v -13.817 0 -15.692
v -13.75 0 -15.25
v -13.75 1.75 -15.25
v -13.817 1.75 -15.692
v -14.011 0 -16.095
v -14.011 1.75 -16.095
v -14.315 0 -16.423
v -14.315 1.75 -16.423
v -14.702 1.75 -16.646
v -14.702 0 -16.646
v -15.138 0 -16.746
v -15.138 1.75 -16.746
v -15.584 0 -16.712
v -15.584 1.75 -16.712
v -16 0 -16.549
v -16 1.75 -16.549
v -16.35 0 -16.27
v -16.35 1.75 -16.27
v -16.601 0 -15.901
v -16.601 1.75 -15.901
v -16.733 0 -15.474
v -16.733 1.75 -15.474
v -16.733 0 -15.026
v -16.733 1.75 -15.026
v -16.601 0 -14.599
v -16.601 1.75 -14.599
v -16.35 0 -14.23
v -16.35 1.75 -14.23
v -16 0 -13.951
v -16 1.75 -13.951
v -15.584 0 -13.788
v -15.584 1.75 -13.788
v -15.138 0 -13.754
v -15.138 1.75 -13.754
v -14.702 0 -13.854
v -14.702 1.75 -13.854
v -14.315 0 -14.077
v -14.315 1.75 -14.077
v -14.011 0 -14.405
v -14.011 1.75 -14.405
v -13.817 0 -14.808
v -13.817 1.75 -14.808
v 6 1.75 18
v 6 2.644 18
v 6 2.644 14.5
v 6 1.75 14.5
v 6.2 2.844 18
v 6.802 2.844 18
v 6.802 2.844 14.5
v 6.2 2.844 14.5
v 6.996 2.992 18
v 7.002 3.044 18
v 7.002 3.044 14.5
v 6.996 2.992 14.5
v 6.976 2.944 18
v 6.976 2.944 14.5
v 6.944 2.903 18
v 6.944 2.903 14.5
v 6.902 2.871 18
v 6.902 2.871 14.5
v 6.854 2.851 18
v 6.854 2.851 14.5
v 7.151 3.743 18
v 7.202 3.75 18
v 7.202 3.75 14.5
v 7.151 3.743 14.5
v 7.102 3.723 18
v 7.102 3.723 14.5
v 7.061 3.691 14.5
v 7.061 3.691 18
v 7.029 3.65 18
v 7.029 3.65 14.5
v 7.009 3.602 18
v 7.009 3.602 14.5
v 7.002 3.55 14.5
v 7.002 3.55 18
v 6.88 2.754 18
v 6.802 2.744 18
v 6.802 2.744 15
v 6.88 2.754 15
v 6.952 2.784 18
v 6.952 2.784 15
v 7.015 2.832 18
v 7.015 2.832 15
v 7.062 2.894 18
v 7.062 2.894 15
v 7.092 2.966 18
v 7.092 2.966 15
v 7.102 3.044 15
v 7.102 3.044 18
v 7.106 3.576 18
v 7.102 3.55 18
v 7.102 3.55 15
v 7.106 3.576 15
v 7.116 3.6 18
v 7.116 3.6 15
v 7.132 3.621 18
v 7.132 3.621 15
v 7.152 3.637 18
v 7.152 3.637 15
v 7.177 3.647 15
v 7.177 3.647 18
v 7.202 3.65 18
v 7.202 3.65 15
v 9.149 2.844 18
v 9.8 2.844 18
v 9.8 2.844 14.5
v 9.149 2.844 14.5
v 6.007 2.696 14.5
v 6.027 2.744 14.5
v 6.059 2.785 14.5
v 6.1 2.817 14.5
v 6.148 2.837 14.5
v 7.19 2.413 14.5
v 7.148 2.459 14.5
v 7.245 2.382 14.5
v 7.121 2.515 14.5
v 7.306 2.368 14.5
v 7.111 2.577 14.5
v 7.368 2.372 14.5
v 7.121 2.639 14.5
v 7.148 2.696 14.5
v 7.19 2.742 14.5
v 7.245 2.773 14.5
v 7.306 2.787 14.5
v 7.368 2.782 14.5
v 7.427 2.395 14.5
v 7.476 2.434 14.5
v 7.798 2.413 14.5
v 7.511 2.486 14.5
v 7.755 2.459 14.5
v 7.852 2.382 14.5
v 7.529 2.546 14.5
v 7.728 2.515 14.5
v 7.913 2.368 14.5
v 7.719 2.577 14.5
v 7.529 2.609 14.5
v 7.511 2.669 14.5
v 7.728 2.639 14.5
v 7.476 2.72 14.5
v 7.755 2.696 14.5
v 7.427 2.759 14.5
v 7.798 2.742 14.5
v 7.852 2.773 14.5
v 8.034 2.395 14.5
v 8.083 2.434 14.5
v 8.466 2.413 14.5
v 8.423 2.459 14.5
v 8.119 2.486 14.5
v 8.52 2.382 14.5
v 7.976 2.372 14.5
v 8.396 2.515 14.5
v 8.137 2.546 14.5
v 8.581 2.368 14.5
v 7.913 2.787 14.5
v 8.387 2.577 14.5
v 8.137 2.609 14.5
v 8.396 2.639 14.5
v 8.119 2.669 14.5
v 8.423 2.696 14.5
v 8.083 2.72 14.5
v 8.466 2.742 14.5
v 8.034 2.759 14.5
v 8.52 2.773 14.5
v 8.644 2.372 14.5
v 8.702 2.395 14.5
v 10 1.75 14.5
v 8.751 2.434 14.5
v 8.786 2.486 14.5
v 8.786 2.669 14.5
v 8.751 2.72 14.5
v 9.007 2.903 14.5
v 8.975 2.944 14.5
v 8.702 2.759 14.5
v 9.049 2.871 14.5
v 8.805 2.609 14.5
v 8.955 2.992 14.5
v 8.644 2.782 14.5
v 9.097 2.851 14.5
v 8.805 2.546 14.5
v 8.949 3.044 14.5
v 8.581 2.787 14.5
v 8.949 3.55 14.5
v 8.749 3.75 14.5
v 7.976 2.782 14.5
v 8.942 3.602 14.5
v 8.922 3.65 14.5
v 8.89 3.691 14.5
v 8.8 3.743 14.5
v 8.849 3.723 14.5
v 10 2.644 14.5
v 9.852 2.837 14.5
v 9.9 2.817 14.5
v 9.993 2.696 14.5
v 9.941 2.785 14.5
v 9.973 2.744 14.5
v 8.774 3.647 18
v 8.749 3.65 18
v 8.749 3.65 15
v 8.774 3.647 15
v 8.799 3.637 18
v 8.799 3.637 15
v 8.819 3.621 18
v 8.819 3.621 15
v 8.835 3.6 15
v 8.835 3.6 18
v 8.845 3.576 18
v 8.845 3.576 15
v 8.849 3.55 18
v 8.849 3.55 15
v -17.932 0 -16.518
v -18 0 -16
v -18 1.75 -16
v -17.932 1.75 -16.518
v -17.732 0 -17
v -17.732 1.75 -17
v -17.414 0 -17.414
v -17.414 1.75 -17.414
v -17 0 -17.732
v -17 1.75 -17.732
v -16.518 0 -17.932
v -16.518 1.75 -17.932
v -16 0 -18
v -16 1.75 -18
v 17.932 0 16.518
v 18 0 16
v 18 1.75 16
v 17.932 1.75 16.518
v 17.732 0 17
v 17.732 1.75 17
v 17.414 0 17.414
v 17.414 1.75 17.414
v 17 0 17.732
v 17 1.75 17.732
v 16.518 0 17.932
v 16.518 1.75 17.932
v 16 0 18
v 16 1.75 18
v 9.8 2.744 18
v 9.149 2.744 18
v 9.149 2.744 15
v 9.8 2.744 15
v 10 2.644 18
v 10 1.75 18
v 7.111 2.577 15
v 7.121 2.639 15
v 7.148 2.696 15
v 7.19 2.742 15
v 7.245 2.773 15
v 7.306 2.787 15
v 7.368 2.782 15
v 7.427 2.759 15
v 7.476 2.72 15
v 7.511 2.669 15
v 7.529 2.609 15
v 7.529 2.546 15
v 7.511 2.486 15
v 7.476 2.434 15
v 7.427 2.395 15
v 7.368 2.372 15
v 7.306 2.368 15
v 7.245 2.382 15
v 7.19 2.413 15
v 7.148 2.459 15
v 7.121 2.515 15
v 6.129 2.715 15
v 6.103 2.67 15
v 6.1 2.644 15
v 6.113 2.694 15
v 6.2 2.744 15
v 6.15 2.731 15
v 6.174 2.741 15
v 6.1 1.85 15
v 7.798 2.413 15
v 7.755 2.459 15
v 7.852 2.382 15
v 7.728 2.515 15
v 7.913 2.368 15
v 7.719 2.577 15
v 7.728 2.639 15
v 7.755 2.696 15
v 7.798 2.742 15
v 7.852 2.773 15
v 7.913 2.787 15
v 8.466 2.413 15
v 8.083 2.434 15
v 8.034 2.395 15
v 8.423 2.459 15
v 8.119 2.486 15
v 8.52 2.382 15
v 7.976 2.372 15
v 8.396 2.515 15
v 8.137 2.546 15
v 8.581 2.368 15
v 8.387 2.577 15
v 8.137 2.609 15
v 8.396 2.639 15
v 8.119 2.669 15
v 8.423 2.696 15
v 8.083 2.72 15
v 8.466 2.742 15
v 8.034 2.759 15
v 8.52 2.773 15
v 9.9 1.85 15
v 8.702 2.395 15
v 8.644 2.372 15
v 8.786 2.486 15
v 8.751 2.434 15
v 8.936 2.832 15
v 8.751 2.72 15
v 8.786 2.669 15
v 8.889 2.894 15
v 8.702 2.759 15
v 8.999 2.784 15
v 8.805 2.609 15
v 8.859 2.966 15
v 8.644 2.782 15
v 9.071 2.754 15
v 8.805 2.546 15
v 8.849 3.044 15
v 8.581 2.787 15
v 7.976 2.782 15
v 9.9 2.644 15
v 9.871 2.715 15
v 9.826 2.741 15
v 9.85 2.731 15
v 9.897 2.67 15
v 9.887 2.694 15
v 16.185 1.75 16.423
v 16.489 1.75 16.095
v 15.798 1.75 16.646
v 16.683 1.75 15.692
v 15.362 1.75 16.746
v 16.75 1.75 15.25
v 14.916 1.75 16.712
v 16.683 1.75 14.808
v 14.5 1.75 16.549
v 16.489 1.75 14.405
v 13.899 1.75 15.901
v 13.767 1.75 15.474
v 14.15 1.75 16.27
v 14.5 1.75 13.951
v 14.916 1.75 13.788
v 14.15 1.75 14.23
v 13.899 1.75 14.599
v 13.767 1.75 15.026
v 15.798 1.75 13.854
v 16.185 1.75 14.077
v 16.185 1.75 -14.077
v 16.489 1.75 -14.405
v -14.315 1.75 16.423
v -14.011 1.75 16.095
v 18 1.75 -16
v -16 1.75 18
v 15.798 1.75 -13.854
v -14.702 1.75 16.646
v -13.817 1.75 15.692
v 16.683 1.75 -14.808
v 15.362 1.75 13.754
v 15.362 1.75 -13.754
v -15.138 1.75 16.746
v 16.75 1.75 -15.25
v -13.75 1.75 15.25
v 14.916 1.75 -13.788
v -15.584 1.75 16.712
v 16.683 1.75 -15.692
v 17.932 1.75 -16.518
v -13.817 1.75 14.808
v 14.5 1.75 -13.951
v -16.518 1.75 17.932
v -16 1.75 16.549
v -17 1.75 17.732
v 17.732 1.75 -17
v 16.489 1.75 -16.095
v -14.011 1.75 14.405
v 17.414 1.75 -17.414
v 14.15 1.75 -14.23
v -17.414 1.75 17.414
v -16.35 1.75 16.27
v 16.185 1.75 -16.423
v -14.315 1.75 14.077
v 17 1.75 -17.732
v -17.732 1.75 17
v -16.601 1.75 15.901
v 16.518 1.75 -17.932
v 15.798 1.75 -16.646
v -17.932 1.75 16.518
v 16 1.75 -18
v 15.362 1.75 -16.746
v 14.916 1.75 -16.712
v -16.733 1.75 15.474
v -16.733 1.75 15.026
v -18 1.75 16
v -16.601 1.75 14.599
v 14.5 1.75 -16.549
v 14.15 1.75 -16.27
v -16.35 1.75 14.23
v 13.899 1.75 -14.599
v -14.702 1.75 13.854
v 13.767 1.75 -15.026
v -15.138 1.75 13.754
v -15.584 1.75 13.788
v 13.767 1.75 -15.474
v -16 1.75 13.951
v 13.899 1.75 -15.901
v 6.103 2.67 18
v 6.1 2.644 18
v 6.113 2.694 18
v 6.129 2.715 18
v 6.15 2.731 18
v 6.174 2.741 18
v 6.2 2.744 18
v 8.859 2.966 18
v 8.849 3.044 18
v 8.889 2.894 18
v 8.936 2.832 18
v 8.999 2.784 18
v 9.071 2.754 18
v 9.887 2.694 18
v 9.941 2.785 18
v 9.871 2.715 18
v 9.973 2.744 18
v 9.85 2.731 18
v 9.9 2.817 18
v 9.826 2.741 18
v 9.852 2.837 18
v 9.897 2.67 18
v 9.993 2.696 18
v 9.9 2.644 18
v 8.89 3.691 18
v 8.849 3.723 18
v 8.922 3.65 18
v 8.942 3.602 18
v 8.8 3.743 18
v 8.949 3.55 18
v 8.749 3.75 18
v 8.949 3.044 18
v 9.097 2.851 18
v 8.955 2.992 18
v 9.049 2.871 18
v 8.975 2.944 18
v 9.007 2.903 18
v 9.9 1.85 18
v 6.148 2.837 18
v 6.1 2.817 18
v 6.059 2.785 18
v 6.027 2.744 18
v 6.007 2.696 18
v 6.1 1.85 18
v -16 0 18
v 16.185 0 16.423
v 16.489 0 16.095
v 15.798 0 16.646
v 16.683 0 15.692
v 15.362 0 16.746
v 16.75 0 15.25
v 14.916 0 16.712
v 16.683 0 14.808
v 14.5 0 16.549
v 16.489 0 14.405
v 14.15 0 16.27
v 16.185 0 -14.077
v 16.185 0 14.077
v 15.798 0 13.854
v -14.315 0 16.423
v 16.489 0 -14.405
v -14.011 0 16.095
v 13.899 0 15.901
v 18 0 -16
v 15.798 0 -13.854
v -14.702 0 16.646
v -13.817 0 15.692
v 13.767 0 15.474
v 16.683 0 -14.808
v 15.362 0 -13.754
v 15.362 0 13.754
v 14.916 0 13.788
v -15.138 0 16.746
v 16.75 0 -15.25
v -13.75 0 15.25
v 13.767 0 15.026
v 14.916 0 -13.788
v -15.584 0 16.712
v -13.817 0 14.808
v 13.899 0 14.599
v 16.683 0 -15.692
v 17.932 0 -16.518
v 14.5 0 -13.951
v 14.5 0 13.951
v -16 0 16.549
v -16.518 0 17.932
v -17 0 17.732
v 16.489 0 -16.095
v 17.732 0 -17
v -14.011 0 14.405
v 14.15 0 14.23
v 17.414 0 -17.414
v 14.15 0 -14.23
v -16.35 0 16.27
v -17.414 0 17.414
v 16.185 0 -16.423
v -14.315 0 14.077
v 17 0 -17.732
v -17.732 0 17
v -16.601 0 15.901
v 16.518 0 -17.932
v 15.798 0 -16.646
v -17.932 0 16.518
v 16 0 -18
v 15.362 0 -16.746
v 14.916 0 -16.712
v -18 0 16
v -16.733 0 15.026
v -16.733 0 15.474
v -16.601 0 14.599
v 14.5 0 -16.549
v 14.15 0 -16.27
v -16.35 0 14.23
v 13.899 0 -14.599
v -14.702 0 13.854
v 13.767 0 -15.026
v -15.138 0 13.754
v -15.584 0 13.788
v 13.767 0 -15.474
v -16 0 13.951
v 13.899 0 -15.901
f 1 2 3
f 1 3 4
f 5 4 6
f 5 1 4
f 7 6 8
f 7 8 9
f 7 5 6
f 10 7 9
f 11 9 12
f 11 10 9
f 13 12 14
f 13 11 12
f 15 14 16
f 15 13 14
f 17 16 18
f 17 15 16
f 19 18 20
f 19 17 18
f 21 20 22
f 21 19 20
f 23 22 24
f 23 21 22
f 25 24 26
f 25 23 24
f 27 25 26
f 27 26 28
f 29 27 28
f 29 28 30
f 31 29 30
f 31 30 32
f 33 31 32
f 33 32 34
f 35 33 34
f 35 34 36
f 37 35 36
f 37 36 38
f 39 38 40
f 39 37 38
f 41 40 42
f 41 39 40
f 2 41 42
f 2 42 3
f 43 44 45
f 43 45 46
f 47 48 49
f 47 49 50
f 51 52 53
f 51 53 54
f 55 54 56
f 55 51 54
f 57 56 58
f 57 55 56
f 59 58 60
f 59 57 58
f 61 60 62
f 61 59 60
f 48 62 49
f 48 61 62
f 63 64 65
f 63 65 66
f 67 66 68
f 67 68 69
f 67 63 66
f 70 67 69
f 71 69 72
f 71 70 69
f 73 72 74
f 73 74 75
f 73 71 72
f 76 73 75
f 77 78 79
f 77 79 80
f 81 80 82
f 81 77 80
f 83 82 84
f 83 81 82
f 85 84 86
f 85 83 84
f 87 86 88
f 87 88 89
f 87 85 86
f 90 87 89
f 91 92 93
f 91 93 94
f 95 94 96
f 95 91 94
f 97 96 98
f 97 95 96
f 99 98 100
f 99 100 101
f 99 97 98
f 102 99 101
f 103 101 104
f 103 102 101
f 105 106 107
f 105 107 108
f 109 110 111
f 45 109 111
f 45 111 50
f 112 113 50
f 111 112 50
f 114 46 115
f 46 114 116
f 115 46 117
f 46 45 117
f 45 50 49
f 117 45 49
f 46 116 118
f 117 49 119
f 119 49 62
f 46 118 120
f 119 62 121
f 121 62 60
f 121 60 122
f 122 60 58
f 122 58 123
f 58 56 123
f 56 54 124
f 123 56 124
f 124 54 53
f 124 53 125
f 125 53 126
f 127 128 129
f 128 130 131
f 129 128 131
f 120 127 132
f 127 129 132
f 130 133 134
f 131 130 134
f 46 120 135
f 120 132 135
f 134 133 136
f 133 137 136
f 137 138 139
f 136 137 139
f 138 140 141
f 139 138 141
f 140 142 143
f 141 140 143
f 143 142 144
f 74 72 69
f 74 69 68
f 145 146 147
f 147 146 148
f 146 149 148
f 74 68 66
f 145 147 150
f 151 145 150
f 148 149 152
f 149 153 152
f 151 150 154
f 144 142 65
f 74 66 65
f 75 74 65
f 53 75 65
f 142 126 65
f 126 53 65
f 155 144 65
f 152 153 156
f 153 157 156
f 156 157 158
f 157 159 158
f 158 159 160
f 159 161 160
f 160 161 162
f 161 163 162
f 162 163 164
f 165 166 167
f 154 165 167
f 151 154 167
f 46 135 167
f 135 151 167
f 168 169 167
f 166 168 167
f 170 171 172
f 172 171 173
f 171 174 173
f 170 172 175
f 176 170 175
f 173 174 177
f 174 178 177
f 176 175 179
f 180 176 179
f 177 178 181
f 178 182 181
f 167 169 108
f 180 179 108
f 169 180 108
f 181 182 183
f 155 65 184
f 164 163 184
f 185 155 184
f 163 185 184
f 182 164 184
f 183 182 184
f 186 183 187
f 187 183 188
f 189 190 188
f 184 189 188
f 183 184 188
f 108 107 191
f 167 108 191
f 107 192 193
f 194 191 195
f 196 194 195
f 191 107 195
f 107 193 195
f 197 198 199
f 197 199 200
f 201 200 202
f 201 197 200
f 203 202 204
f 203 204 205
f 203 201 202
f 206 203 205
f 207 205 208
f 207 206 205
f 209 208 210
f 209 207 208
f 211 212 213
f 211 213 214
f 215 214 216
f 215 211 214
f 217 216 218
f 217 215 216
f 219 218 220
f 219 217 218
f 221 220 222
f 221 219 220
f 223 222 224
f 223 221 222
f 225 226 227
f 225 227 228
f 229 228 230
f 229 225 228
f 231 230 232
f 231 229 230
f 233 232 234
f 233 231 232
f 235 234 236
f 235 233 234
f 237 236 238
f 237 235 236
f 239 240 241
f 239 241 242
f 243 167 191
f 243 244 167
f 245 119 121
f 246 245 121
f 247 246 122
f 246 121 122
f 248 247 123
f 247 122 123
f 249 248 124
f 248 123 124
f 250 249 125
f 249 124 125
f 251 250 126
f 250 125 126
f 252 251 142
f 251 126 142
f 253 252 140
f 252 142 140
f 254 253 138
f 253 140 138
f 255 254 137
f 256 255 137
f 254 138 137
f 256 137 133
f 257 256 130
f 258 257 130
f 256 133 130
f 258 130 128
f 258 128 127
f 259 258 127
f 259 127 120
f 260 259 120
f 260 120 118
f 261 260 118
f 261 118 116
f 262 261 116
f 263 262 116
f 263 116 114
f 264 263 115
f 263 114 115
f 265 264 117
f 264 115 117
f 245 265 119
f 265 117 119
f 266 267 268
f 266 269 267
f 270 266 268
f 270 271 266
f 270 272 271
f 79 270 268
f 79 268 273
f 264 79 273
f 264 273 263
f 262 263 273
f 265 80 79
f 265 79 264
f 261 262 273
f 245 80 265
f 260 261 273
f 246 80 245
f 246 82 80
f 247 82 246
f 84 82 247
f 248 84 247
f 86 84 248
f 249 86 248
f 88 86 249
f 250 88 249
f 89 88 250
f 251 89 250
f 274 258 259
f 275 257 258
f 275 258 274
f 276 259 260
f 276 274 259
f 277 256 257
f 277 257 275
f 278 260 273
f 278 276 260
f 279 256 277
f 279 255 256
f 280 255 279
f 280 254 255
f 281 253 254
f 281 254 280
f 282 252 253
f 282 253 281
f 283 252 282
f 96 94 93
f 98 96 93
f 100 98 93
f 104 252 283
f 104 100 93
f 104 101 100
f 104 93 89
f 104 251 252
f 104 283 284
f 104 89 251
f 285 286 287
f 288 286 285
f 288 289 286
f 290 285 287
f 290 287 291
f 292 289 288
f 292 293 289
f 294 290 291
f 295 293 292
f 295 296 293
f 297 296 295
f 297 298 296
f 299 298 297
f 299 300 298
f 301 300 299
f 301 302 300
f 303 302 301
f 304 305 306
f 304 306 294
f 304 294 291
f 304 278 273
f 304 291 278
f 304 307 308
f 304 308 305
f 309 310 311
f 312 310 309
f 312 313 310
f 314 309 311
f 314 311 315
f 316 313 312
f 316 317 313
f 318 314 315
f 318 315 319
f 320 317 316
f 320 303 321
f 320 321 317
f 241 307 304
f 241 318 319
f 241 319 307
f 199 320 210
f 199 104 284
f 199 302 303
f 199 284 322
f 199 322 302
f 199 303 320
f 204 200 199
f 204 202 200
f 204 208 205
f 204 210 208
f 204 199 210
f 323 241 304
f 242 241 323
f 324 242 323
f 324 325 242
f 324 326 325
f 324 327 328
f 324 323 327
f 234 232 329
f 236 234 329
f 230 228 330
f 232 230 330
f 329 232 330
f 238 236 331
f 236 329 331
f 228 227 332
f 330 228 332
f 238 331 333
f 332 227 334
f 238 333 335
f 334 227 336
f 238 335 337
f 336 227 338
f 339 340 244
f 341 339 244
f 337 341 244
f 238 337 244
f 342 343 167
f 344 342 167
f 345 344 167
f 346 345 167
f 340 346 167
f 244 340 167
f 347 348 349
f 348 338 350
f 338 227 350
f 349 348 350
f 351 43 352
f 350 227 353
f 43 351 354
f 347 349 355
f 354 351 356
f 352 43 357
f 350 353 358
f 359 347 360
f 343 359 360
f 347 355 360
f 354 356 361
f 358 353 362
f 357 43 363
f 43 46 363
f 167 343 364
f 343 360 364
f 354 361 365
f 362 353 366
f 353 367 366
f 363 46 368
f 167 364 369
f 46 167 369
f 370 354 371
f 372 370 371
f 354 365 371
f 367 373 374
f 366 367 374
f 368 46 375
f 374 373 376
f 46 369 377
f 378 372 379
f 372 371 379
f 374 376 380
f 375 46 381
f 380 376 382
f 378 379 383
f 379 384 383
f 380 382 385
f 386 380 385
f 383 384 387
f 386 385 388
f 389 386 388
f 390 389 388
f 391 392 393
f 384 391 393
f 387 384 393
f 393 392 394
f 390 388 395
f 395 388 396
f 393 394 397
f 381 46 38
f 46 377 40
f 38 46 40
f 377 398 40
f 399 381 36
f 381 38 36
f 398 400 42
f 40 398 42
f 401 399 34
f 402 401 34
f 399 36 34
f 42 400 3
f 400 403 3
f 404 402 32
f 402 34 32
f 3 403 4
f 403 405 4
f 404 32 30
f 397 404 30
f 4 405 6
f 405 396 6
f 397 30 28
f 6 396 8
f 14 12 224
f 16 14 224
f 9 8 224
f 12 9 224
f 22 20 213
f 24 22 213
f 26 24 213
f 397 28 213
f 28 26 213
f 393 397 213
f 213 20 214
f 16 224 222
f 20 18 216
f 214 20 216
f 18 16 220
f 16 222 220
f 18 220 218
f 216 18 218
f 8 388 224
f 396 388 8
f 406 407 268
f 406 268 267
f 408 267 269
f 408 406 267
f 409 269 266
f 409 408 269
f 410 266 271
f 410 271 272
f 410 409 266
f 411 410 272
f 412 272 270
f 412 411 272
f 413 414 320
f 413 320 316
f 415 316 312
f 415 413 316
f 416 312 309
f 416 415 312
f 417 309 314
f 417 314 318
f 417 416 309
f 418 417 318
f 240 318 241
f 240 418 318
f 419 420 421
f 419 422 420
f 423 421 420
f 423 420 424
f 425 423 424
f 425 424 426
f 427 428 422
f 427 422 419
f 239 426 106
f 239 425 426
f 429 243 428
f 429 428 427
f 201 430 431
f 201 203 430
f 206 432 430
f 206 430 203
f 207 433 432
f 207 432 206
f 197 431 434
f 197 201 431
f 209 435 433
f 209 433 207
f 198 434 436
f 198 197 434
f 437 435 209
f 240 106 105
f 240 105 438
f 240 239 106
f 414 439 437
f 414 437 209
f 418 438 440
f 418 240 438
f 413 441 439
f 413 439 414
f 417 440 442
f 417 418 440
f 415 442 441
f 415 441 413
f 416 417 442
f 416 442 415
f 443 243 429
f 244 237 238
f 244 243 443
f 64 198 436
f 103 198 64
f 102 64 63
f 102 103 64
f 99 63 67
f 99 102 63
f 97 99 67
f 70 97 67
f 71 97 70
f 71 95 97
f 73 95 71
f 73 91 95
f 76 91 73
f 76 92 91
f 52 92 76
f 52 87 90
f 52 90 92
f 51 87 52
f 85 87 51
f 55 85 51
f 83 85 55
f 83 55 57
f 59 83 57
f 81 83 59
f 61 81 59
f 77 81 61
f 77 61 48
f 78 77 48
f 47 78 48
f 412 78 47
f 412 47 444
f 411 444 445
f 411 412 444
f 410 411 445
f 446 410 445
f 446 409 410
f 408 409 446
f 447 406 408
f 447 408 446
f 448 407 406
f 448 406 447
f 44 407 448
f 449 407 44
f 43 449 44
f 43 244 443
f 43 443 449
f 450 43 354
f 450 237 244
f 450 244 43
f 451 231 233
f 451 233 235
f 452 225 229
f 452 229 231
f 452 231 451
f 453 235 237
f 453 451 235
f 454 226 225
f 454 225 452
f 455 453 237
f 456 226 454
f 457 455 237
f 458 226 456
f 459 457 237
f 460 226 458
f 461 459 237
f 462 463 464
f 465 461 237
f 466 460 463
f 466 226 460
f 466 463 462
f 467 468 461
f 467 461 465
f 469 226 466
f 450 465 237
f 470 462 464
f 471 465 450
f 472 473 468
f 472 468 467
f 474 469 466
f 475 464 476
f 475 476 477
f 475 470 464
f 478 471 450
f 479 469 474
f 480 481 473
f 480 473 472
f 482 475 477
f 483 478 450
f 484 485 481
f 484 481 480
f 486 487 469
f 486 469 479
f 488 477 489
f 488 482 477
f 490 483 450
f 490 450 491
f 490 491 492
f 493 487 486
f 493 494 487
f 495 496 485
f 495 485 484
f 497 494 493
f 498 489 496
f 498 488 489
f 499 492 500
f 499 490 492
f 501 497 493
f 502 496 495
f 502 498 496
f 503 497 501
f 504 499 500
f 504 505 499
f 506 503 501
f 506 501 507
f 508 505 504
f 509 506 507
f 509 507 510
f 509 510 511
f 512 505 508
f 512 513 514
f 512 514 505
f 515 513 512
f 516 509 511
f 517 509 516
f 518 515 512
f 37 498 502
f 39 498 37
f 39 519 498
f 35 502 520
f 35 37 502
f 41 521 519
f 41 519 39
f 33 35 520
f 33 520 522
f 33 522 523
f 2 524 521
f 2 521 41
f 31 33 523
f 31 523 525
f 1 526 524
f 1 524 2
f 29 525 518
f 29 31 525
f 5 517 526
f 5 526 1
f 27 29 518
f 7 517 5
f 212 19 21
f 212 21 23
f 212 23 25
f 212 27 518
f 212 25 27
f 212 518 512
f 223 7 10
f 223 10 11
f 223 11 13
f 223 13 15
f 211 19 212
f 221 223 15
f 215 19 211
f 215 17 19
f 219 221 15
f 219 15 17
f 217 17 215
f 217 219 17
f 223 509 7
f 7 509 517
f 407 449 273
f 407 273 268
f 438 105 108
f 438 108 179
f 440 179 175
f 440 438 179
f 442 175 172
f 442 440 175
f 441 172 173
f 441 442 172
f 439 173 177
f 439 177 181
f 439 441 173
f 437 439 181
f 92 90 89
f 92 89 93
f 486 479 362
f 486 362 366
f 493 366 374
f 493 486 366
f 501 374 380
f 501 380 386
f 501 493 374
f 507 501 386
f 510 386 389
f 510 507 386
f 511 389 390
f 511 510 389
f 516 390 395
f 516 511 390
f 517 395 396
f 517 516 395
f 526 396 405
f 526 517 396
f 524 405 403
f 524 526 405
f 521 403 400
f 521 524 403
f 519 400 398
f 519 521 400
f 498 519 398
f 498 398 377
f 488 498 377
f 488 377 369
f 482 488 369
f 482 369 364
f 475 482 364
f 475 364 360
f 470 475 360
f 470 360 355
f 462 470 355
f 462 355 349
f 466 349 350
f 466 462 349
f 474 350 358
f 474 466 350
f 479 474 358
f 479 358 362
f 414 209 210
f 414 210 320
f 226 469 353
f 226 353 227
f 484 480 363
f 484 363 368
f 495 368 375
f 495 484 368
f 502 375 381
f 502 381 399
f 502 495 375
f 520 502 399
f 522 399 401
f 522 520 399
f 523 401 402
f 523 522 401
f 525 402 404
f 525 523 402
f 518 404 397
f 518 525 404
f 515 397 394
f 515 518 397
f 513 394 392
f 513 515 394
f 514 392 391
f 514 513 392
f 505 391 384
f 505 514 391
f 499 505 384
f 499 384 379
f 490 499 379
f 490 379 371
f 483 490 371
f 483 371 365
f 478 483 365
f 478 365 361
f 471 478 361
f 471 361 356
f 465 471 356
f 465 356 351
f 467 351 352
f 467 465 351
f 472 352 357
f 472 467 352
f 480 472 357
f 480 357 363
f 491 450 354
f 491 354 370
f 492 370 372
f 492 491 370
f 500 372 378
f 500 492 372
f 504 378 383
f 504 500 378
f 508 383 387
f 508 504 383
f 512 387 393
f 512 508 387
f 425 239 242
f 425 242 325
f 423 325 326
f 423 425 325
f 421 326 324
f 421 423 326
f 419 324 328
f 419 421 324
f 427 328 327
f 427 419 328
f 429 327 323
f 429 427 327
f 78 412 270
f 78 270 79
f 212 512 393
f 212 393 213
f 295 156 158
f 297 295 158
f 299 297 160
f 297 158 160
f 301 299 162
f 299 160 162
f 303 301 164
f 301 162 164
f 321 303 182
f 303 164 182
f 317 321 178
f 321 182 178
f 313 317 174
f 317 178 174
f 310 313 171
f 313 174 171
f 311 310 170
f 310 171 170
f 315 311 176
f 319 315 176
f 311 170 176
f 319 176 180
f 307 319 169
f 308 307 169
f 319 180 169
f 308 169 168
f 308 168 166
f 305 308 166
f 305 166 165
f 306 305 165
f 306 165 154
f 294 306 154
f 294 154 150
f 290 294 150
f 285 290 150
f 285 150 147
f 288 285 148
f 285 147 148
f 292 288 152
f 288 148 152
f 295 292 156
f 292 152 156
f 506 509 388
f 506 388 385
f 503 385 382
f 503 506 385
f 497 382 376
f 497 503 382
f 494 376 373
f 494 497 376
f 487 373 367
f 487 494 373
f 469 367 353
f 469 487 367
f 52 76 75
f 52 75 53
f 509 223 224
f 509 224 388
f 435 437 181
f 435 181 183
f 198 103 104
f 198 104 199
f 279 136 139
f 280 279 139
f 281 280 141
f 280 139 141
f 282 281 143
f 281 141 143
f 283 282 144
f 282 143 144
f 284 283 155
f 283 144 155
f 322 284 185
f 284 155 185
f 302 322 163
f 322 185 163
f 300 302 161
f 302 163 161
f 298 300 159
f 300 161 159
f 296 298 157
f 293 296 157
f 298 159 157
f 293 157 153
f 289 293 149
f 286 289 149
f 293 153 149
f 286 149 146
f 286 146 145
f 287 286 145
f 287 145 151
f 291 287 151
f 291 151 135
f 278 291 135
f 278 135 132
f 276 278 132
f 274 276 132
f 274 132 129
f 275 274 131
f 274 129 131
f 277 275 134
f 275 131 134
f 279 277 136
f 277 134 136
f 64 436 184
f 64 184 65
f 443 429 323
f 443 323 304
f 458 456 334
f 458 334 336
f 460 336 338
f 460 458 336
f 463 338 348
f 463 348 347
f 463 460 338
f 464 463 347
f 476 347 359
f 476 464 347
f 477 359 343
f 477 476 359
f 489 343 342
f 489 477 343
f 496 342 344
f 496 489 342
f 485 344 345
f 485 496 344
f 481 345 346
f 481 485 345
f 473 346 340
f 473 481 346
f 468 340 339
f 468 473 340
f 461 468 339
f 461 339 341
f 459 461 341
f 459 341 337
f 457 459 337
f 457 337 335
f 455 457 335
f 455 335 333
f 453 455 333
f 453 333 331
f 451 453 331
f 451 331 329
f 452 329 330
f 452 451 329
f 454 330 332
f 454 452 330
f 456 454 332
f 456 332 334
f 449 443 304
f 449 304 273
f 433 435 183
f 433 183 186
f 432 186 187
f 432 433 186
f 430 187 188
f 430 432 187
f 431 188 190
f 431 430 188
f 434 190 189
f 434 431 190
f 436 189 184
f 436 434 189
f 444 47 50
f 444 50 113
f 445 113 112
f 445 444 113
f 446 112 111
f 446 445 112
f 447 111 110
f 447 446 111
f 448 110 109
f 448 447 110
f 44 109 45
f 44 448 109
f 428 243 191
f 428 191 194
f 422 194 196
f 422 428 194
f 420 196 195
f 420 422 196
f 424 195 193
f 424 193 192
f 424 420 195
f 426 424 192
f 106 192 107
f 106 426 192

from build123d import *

# Parameters (mm, degrees)
SKETCH1_R           = 1.5
BOSS_EXTRUDE2_DEPTH = 1.75
BOSS_EXTRUDE3_DEPTH = 3
BOSS_EXTRUDE4_DEPTH = 0.5
SKETCH5_R           = 0.210276494
CUT_EXTRUDE1_DEPTH  = 0.5


with BuildPart() as part:
    # Sketch1 → Boss-Extrude2 (new body)
    with BuildSketch(Plane(origin=(0, 0, 0), x_dir=(1, 0, 0), z_dir=(0, 1, 0))):
        with BuildLine():
            Line((-16, 18), (16, 18))
            ThreePointArc((16, 18), (17.414213562, 17.414213562), (18, 16))
            Line((18, 16), (18, -16))
            ThreePointArc((18, -16), (17.414213562, -17.414213562), (16, -18))
            Line((16, -18), (-16, -18))
            ThreePointArc((-16, -18), (-17.414213562, -17.414213562), (-18, -16))
            Line((-18, -16), (-18, 16))
            ThreePointArc((-18, 16), (-17.414213562, 17.414213562), (-16, 18))
        make_face()
        with Locations((-15.25, 15.25)):
            Circle(SKETCH1_R, mode=Mode.SUBTRACT)
        with Locations((15.25, 15.25)):
            Circle(SKETCH1_R, mode=Mode.SUBTRACT)
        with Locations((15.25, -15.25)):
            Circle(SKETCH1_R, mode=Mode.SUBTRACT)
        with Locations((-15.25, -15.25)):
            Circle(SKETCH1_R, mode=Mode.SUBTRACT)
    extrude(amount=BOSS_EXTRUDE2_DEPTH)

    # Sketch3 → Boss-Extrude3 (add)
    with BuildSketch(Plane.XY.offset(18)):
        with BuildLine():
            Line((6, 1.75), (10, 1.75))
            Line((10, 1.75), (10, 2.643928524))
            ThreePointArc((10, 2.643928524), (9.941421356, 2.78534988), (9.8, 2.843928524))
            Line((9.8, 2.843928524), (9.148500836, 2.843928524))
            ThreePointArc((9.148500836, 2.843928524), (9.007079479, 2.902507168), (8.948500836, 3.043928524))
            Line((8.948500836, 3.043928524), (8.948500836, 3.55))
            ThreePointArc((8.948500836, 3.55), (8.889922192, 3.691421356), (8.748500836, 3.75))
            Line((8.748500836, 3.75), (7.202410951, 3.75))
            ThreePointArc((7.202410951, 3.75), (7.060989594, 3.691421356), (7.002410951, 3.55))
            Line((7.002410951, 3.55), (7.002410951, 3.043928524))
            ThreePointArc((7.002410951, 3.043928524), (6.943832307, 2.902507168), (6.802410951, 2.843928524))
            Line((6.802410951, 2.843928524), (6.2, 2.843928524))
            ThreePointArc((6.2, 2.843928524), (6.058578644, 2.78534988), (6, 2.643928524))
            Line((6, 2.643928524), (6, 1.75))
        make_face()
        with BuildLine():
            Line((6.1, 1.85), (6.1, 2.643928524))
            ThreePointArc((6.1, 2.643928524), (6.129289322, 2.714639202), (6.2, 2.743928524))
            Line((6.2, 2.743928524), (6.802410951, 2.743928524))
            ThreePointArc((6.802410951, 2.743928524), (7.014542985, 2.83179649), (7.102410951, 3.043928524))
            Line((7.102410951, 3.043928524), (7.102410951, 3.55))
            ThreePointArc((7.102410951, 3.55), (7.131700273, 3.620710678), (7.202410951, 3.65))
            Line((7.202410951, 3.65), (8.748500836, 3.65))
            ThreePointArc((8.748500836, 3.65), (8.819211514, 3.620710678), (8.848500836, 3.55))
            Line((8.848500836, 3.55), (8.848500836, 3.043928524))
            ThreePointArc((8.848500836, 3.043928524), (8.936368801, 2.83179649), (9.148500836, 2.743928524))
            Line((9.148500836, 2.743928524), (9.8, 2.743928524))
            ThreePointArc((9.8, 2.743928524), (9.870710678, 2.714639202), (9.9, 2.643928524))
            Line((9.9, 2.643928524), (9.9, 1.85))
            Line((9.9, 1.85), (6.1, 1.85))
        make_face(mode=Mode.SUBTRACT)
    extrude(amount=-BOSS_EXTRUDE3_DEPTH)

    # Sketch4 → Boss-Extrude4 (add)
    with BuildSketch(Plane(origin=(0, 0, 15), x_dir=(-1, 0, 0), z_dir=(0, 0, -1))):
        with BuildLine():
            Line((-6, 1.75), (-10, 1.75))
            Line((-10, 1.75), (-10, 2.643928524))
            ThreePointArc((-10, 2.643928524), (-9.941421356, 2.78534988), (-9.8, 2.843928524))
            Line((-9.8, 2.843928524), (-9.148500836, 2.843928524))
            ThreePointArc((-9.148500836, 2.843928524), (-9.007079479, 2.902507168), (-8.948500836, 3.043928524))
            Line((-8.948500836, 3.043928524), (-8.948500836, 3.55))
            ThreePointArc((-8.948500836, 3.55), (-8.889922192, 3.691421356), (-8.748500836, 3.75))
            Line((-8.748500836, 3.75), (-7.202410951, 3.75))
            ThreePointArc((-7.202410951, 3.75), (-7.060989594, 3.691421356), (-7.002410951, 3.55))
            Line((-7.002410951, 3.55), (-7.002410951, 3.043928524))
            ThreePointArc((-7.002410951, 3.043928524), (-6.943832307, 2.902507168), (-6.802410951, 2.843928524))
            Line((-6.802410951, 2.843928524), (-6.2, 2.843928524))
            ThreePointArc((-6.2, 2.843928524), (-6.058578644, 2.78534988), (-6, 2.643928524))
            Line((-6, 2.643928524), (-6, 1.75))
        make_face()
    extrude(amount=BOSS_EXTRUDE4_DEPTH)

    # Sketch5 → Cut-Extrude1 (cut)
    with BuildSketch(Plane(origin=(0, 0, 14.5), x_dir=(-1, 0, 0), z_dir=(0, 0, -1))):
        with Locations((-8.596830264, 2.577355932)):
            Circle(SKETCH5_R)
        with Locations((-7.929200441, 2.577355932)):
            Circle(SKETCH5_R)
        with Locations((-7.321447194, 2.577355932)):
            Circle(SKETCH5_R)
    extrude(amount=-CUT_EXTRUDE1_DEPTH, mode=Mode.SUBTRACT)


solid = part.part
